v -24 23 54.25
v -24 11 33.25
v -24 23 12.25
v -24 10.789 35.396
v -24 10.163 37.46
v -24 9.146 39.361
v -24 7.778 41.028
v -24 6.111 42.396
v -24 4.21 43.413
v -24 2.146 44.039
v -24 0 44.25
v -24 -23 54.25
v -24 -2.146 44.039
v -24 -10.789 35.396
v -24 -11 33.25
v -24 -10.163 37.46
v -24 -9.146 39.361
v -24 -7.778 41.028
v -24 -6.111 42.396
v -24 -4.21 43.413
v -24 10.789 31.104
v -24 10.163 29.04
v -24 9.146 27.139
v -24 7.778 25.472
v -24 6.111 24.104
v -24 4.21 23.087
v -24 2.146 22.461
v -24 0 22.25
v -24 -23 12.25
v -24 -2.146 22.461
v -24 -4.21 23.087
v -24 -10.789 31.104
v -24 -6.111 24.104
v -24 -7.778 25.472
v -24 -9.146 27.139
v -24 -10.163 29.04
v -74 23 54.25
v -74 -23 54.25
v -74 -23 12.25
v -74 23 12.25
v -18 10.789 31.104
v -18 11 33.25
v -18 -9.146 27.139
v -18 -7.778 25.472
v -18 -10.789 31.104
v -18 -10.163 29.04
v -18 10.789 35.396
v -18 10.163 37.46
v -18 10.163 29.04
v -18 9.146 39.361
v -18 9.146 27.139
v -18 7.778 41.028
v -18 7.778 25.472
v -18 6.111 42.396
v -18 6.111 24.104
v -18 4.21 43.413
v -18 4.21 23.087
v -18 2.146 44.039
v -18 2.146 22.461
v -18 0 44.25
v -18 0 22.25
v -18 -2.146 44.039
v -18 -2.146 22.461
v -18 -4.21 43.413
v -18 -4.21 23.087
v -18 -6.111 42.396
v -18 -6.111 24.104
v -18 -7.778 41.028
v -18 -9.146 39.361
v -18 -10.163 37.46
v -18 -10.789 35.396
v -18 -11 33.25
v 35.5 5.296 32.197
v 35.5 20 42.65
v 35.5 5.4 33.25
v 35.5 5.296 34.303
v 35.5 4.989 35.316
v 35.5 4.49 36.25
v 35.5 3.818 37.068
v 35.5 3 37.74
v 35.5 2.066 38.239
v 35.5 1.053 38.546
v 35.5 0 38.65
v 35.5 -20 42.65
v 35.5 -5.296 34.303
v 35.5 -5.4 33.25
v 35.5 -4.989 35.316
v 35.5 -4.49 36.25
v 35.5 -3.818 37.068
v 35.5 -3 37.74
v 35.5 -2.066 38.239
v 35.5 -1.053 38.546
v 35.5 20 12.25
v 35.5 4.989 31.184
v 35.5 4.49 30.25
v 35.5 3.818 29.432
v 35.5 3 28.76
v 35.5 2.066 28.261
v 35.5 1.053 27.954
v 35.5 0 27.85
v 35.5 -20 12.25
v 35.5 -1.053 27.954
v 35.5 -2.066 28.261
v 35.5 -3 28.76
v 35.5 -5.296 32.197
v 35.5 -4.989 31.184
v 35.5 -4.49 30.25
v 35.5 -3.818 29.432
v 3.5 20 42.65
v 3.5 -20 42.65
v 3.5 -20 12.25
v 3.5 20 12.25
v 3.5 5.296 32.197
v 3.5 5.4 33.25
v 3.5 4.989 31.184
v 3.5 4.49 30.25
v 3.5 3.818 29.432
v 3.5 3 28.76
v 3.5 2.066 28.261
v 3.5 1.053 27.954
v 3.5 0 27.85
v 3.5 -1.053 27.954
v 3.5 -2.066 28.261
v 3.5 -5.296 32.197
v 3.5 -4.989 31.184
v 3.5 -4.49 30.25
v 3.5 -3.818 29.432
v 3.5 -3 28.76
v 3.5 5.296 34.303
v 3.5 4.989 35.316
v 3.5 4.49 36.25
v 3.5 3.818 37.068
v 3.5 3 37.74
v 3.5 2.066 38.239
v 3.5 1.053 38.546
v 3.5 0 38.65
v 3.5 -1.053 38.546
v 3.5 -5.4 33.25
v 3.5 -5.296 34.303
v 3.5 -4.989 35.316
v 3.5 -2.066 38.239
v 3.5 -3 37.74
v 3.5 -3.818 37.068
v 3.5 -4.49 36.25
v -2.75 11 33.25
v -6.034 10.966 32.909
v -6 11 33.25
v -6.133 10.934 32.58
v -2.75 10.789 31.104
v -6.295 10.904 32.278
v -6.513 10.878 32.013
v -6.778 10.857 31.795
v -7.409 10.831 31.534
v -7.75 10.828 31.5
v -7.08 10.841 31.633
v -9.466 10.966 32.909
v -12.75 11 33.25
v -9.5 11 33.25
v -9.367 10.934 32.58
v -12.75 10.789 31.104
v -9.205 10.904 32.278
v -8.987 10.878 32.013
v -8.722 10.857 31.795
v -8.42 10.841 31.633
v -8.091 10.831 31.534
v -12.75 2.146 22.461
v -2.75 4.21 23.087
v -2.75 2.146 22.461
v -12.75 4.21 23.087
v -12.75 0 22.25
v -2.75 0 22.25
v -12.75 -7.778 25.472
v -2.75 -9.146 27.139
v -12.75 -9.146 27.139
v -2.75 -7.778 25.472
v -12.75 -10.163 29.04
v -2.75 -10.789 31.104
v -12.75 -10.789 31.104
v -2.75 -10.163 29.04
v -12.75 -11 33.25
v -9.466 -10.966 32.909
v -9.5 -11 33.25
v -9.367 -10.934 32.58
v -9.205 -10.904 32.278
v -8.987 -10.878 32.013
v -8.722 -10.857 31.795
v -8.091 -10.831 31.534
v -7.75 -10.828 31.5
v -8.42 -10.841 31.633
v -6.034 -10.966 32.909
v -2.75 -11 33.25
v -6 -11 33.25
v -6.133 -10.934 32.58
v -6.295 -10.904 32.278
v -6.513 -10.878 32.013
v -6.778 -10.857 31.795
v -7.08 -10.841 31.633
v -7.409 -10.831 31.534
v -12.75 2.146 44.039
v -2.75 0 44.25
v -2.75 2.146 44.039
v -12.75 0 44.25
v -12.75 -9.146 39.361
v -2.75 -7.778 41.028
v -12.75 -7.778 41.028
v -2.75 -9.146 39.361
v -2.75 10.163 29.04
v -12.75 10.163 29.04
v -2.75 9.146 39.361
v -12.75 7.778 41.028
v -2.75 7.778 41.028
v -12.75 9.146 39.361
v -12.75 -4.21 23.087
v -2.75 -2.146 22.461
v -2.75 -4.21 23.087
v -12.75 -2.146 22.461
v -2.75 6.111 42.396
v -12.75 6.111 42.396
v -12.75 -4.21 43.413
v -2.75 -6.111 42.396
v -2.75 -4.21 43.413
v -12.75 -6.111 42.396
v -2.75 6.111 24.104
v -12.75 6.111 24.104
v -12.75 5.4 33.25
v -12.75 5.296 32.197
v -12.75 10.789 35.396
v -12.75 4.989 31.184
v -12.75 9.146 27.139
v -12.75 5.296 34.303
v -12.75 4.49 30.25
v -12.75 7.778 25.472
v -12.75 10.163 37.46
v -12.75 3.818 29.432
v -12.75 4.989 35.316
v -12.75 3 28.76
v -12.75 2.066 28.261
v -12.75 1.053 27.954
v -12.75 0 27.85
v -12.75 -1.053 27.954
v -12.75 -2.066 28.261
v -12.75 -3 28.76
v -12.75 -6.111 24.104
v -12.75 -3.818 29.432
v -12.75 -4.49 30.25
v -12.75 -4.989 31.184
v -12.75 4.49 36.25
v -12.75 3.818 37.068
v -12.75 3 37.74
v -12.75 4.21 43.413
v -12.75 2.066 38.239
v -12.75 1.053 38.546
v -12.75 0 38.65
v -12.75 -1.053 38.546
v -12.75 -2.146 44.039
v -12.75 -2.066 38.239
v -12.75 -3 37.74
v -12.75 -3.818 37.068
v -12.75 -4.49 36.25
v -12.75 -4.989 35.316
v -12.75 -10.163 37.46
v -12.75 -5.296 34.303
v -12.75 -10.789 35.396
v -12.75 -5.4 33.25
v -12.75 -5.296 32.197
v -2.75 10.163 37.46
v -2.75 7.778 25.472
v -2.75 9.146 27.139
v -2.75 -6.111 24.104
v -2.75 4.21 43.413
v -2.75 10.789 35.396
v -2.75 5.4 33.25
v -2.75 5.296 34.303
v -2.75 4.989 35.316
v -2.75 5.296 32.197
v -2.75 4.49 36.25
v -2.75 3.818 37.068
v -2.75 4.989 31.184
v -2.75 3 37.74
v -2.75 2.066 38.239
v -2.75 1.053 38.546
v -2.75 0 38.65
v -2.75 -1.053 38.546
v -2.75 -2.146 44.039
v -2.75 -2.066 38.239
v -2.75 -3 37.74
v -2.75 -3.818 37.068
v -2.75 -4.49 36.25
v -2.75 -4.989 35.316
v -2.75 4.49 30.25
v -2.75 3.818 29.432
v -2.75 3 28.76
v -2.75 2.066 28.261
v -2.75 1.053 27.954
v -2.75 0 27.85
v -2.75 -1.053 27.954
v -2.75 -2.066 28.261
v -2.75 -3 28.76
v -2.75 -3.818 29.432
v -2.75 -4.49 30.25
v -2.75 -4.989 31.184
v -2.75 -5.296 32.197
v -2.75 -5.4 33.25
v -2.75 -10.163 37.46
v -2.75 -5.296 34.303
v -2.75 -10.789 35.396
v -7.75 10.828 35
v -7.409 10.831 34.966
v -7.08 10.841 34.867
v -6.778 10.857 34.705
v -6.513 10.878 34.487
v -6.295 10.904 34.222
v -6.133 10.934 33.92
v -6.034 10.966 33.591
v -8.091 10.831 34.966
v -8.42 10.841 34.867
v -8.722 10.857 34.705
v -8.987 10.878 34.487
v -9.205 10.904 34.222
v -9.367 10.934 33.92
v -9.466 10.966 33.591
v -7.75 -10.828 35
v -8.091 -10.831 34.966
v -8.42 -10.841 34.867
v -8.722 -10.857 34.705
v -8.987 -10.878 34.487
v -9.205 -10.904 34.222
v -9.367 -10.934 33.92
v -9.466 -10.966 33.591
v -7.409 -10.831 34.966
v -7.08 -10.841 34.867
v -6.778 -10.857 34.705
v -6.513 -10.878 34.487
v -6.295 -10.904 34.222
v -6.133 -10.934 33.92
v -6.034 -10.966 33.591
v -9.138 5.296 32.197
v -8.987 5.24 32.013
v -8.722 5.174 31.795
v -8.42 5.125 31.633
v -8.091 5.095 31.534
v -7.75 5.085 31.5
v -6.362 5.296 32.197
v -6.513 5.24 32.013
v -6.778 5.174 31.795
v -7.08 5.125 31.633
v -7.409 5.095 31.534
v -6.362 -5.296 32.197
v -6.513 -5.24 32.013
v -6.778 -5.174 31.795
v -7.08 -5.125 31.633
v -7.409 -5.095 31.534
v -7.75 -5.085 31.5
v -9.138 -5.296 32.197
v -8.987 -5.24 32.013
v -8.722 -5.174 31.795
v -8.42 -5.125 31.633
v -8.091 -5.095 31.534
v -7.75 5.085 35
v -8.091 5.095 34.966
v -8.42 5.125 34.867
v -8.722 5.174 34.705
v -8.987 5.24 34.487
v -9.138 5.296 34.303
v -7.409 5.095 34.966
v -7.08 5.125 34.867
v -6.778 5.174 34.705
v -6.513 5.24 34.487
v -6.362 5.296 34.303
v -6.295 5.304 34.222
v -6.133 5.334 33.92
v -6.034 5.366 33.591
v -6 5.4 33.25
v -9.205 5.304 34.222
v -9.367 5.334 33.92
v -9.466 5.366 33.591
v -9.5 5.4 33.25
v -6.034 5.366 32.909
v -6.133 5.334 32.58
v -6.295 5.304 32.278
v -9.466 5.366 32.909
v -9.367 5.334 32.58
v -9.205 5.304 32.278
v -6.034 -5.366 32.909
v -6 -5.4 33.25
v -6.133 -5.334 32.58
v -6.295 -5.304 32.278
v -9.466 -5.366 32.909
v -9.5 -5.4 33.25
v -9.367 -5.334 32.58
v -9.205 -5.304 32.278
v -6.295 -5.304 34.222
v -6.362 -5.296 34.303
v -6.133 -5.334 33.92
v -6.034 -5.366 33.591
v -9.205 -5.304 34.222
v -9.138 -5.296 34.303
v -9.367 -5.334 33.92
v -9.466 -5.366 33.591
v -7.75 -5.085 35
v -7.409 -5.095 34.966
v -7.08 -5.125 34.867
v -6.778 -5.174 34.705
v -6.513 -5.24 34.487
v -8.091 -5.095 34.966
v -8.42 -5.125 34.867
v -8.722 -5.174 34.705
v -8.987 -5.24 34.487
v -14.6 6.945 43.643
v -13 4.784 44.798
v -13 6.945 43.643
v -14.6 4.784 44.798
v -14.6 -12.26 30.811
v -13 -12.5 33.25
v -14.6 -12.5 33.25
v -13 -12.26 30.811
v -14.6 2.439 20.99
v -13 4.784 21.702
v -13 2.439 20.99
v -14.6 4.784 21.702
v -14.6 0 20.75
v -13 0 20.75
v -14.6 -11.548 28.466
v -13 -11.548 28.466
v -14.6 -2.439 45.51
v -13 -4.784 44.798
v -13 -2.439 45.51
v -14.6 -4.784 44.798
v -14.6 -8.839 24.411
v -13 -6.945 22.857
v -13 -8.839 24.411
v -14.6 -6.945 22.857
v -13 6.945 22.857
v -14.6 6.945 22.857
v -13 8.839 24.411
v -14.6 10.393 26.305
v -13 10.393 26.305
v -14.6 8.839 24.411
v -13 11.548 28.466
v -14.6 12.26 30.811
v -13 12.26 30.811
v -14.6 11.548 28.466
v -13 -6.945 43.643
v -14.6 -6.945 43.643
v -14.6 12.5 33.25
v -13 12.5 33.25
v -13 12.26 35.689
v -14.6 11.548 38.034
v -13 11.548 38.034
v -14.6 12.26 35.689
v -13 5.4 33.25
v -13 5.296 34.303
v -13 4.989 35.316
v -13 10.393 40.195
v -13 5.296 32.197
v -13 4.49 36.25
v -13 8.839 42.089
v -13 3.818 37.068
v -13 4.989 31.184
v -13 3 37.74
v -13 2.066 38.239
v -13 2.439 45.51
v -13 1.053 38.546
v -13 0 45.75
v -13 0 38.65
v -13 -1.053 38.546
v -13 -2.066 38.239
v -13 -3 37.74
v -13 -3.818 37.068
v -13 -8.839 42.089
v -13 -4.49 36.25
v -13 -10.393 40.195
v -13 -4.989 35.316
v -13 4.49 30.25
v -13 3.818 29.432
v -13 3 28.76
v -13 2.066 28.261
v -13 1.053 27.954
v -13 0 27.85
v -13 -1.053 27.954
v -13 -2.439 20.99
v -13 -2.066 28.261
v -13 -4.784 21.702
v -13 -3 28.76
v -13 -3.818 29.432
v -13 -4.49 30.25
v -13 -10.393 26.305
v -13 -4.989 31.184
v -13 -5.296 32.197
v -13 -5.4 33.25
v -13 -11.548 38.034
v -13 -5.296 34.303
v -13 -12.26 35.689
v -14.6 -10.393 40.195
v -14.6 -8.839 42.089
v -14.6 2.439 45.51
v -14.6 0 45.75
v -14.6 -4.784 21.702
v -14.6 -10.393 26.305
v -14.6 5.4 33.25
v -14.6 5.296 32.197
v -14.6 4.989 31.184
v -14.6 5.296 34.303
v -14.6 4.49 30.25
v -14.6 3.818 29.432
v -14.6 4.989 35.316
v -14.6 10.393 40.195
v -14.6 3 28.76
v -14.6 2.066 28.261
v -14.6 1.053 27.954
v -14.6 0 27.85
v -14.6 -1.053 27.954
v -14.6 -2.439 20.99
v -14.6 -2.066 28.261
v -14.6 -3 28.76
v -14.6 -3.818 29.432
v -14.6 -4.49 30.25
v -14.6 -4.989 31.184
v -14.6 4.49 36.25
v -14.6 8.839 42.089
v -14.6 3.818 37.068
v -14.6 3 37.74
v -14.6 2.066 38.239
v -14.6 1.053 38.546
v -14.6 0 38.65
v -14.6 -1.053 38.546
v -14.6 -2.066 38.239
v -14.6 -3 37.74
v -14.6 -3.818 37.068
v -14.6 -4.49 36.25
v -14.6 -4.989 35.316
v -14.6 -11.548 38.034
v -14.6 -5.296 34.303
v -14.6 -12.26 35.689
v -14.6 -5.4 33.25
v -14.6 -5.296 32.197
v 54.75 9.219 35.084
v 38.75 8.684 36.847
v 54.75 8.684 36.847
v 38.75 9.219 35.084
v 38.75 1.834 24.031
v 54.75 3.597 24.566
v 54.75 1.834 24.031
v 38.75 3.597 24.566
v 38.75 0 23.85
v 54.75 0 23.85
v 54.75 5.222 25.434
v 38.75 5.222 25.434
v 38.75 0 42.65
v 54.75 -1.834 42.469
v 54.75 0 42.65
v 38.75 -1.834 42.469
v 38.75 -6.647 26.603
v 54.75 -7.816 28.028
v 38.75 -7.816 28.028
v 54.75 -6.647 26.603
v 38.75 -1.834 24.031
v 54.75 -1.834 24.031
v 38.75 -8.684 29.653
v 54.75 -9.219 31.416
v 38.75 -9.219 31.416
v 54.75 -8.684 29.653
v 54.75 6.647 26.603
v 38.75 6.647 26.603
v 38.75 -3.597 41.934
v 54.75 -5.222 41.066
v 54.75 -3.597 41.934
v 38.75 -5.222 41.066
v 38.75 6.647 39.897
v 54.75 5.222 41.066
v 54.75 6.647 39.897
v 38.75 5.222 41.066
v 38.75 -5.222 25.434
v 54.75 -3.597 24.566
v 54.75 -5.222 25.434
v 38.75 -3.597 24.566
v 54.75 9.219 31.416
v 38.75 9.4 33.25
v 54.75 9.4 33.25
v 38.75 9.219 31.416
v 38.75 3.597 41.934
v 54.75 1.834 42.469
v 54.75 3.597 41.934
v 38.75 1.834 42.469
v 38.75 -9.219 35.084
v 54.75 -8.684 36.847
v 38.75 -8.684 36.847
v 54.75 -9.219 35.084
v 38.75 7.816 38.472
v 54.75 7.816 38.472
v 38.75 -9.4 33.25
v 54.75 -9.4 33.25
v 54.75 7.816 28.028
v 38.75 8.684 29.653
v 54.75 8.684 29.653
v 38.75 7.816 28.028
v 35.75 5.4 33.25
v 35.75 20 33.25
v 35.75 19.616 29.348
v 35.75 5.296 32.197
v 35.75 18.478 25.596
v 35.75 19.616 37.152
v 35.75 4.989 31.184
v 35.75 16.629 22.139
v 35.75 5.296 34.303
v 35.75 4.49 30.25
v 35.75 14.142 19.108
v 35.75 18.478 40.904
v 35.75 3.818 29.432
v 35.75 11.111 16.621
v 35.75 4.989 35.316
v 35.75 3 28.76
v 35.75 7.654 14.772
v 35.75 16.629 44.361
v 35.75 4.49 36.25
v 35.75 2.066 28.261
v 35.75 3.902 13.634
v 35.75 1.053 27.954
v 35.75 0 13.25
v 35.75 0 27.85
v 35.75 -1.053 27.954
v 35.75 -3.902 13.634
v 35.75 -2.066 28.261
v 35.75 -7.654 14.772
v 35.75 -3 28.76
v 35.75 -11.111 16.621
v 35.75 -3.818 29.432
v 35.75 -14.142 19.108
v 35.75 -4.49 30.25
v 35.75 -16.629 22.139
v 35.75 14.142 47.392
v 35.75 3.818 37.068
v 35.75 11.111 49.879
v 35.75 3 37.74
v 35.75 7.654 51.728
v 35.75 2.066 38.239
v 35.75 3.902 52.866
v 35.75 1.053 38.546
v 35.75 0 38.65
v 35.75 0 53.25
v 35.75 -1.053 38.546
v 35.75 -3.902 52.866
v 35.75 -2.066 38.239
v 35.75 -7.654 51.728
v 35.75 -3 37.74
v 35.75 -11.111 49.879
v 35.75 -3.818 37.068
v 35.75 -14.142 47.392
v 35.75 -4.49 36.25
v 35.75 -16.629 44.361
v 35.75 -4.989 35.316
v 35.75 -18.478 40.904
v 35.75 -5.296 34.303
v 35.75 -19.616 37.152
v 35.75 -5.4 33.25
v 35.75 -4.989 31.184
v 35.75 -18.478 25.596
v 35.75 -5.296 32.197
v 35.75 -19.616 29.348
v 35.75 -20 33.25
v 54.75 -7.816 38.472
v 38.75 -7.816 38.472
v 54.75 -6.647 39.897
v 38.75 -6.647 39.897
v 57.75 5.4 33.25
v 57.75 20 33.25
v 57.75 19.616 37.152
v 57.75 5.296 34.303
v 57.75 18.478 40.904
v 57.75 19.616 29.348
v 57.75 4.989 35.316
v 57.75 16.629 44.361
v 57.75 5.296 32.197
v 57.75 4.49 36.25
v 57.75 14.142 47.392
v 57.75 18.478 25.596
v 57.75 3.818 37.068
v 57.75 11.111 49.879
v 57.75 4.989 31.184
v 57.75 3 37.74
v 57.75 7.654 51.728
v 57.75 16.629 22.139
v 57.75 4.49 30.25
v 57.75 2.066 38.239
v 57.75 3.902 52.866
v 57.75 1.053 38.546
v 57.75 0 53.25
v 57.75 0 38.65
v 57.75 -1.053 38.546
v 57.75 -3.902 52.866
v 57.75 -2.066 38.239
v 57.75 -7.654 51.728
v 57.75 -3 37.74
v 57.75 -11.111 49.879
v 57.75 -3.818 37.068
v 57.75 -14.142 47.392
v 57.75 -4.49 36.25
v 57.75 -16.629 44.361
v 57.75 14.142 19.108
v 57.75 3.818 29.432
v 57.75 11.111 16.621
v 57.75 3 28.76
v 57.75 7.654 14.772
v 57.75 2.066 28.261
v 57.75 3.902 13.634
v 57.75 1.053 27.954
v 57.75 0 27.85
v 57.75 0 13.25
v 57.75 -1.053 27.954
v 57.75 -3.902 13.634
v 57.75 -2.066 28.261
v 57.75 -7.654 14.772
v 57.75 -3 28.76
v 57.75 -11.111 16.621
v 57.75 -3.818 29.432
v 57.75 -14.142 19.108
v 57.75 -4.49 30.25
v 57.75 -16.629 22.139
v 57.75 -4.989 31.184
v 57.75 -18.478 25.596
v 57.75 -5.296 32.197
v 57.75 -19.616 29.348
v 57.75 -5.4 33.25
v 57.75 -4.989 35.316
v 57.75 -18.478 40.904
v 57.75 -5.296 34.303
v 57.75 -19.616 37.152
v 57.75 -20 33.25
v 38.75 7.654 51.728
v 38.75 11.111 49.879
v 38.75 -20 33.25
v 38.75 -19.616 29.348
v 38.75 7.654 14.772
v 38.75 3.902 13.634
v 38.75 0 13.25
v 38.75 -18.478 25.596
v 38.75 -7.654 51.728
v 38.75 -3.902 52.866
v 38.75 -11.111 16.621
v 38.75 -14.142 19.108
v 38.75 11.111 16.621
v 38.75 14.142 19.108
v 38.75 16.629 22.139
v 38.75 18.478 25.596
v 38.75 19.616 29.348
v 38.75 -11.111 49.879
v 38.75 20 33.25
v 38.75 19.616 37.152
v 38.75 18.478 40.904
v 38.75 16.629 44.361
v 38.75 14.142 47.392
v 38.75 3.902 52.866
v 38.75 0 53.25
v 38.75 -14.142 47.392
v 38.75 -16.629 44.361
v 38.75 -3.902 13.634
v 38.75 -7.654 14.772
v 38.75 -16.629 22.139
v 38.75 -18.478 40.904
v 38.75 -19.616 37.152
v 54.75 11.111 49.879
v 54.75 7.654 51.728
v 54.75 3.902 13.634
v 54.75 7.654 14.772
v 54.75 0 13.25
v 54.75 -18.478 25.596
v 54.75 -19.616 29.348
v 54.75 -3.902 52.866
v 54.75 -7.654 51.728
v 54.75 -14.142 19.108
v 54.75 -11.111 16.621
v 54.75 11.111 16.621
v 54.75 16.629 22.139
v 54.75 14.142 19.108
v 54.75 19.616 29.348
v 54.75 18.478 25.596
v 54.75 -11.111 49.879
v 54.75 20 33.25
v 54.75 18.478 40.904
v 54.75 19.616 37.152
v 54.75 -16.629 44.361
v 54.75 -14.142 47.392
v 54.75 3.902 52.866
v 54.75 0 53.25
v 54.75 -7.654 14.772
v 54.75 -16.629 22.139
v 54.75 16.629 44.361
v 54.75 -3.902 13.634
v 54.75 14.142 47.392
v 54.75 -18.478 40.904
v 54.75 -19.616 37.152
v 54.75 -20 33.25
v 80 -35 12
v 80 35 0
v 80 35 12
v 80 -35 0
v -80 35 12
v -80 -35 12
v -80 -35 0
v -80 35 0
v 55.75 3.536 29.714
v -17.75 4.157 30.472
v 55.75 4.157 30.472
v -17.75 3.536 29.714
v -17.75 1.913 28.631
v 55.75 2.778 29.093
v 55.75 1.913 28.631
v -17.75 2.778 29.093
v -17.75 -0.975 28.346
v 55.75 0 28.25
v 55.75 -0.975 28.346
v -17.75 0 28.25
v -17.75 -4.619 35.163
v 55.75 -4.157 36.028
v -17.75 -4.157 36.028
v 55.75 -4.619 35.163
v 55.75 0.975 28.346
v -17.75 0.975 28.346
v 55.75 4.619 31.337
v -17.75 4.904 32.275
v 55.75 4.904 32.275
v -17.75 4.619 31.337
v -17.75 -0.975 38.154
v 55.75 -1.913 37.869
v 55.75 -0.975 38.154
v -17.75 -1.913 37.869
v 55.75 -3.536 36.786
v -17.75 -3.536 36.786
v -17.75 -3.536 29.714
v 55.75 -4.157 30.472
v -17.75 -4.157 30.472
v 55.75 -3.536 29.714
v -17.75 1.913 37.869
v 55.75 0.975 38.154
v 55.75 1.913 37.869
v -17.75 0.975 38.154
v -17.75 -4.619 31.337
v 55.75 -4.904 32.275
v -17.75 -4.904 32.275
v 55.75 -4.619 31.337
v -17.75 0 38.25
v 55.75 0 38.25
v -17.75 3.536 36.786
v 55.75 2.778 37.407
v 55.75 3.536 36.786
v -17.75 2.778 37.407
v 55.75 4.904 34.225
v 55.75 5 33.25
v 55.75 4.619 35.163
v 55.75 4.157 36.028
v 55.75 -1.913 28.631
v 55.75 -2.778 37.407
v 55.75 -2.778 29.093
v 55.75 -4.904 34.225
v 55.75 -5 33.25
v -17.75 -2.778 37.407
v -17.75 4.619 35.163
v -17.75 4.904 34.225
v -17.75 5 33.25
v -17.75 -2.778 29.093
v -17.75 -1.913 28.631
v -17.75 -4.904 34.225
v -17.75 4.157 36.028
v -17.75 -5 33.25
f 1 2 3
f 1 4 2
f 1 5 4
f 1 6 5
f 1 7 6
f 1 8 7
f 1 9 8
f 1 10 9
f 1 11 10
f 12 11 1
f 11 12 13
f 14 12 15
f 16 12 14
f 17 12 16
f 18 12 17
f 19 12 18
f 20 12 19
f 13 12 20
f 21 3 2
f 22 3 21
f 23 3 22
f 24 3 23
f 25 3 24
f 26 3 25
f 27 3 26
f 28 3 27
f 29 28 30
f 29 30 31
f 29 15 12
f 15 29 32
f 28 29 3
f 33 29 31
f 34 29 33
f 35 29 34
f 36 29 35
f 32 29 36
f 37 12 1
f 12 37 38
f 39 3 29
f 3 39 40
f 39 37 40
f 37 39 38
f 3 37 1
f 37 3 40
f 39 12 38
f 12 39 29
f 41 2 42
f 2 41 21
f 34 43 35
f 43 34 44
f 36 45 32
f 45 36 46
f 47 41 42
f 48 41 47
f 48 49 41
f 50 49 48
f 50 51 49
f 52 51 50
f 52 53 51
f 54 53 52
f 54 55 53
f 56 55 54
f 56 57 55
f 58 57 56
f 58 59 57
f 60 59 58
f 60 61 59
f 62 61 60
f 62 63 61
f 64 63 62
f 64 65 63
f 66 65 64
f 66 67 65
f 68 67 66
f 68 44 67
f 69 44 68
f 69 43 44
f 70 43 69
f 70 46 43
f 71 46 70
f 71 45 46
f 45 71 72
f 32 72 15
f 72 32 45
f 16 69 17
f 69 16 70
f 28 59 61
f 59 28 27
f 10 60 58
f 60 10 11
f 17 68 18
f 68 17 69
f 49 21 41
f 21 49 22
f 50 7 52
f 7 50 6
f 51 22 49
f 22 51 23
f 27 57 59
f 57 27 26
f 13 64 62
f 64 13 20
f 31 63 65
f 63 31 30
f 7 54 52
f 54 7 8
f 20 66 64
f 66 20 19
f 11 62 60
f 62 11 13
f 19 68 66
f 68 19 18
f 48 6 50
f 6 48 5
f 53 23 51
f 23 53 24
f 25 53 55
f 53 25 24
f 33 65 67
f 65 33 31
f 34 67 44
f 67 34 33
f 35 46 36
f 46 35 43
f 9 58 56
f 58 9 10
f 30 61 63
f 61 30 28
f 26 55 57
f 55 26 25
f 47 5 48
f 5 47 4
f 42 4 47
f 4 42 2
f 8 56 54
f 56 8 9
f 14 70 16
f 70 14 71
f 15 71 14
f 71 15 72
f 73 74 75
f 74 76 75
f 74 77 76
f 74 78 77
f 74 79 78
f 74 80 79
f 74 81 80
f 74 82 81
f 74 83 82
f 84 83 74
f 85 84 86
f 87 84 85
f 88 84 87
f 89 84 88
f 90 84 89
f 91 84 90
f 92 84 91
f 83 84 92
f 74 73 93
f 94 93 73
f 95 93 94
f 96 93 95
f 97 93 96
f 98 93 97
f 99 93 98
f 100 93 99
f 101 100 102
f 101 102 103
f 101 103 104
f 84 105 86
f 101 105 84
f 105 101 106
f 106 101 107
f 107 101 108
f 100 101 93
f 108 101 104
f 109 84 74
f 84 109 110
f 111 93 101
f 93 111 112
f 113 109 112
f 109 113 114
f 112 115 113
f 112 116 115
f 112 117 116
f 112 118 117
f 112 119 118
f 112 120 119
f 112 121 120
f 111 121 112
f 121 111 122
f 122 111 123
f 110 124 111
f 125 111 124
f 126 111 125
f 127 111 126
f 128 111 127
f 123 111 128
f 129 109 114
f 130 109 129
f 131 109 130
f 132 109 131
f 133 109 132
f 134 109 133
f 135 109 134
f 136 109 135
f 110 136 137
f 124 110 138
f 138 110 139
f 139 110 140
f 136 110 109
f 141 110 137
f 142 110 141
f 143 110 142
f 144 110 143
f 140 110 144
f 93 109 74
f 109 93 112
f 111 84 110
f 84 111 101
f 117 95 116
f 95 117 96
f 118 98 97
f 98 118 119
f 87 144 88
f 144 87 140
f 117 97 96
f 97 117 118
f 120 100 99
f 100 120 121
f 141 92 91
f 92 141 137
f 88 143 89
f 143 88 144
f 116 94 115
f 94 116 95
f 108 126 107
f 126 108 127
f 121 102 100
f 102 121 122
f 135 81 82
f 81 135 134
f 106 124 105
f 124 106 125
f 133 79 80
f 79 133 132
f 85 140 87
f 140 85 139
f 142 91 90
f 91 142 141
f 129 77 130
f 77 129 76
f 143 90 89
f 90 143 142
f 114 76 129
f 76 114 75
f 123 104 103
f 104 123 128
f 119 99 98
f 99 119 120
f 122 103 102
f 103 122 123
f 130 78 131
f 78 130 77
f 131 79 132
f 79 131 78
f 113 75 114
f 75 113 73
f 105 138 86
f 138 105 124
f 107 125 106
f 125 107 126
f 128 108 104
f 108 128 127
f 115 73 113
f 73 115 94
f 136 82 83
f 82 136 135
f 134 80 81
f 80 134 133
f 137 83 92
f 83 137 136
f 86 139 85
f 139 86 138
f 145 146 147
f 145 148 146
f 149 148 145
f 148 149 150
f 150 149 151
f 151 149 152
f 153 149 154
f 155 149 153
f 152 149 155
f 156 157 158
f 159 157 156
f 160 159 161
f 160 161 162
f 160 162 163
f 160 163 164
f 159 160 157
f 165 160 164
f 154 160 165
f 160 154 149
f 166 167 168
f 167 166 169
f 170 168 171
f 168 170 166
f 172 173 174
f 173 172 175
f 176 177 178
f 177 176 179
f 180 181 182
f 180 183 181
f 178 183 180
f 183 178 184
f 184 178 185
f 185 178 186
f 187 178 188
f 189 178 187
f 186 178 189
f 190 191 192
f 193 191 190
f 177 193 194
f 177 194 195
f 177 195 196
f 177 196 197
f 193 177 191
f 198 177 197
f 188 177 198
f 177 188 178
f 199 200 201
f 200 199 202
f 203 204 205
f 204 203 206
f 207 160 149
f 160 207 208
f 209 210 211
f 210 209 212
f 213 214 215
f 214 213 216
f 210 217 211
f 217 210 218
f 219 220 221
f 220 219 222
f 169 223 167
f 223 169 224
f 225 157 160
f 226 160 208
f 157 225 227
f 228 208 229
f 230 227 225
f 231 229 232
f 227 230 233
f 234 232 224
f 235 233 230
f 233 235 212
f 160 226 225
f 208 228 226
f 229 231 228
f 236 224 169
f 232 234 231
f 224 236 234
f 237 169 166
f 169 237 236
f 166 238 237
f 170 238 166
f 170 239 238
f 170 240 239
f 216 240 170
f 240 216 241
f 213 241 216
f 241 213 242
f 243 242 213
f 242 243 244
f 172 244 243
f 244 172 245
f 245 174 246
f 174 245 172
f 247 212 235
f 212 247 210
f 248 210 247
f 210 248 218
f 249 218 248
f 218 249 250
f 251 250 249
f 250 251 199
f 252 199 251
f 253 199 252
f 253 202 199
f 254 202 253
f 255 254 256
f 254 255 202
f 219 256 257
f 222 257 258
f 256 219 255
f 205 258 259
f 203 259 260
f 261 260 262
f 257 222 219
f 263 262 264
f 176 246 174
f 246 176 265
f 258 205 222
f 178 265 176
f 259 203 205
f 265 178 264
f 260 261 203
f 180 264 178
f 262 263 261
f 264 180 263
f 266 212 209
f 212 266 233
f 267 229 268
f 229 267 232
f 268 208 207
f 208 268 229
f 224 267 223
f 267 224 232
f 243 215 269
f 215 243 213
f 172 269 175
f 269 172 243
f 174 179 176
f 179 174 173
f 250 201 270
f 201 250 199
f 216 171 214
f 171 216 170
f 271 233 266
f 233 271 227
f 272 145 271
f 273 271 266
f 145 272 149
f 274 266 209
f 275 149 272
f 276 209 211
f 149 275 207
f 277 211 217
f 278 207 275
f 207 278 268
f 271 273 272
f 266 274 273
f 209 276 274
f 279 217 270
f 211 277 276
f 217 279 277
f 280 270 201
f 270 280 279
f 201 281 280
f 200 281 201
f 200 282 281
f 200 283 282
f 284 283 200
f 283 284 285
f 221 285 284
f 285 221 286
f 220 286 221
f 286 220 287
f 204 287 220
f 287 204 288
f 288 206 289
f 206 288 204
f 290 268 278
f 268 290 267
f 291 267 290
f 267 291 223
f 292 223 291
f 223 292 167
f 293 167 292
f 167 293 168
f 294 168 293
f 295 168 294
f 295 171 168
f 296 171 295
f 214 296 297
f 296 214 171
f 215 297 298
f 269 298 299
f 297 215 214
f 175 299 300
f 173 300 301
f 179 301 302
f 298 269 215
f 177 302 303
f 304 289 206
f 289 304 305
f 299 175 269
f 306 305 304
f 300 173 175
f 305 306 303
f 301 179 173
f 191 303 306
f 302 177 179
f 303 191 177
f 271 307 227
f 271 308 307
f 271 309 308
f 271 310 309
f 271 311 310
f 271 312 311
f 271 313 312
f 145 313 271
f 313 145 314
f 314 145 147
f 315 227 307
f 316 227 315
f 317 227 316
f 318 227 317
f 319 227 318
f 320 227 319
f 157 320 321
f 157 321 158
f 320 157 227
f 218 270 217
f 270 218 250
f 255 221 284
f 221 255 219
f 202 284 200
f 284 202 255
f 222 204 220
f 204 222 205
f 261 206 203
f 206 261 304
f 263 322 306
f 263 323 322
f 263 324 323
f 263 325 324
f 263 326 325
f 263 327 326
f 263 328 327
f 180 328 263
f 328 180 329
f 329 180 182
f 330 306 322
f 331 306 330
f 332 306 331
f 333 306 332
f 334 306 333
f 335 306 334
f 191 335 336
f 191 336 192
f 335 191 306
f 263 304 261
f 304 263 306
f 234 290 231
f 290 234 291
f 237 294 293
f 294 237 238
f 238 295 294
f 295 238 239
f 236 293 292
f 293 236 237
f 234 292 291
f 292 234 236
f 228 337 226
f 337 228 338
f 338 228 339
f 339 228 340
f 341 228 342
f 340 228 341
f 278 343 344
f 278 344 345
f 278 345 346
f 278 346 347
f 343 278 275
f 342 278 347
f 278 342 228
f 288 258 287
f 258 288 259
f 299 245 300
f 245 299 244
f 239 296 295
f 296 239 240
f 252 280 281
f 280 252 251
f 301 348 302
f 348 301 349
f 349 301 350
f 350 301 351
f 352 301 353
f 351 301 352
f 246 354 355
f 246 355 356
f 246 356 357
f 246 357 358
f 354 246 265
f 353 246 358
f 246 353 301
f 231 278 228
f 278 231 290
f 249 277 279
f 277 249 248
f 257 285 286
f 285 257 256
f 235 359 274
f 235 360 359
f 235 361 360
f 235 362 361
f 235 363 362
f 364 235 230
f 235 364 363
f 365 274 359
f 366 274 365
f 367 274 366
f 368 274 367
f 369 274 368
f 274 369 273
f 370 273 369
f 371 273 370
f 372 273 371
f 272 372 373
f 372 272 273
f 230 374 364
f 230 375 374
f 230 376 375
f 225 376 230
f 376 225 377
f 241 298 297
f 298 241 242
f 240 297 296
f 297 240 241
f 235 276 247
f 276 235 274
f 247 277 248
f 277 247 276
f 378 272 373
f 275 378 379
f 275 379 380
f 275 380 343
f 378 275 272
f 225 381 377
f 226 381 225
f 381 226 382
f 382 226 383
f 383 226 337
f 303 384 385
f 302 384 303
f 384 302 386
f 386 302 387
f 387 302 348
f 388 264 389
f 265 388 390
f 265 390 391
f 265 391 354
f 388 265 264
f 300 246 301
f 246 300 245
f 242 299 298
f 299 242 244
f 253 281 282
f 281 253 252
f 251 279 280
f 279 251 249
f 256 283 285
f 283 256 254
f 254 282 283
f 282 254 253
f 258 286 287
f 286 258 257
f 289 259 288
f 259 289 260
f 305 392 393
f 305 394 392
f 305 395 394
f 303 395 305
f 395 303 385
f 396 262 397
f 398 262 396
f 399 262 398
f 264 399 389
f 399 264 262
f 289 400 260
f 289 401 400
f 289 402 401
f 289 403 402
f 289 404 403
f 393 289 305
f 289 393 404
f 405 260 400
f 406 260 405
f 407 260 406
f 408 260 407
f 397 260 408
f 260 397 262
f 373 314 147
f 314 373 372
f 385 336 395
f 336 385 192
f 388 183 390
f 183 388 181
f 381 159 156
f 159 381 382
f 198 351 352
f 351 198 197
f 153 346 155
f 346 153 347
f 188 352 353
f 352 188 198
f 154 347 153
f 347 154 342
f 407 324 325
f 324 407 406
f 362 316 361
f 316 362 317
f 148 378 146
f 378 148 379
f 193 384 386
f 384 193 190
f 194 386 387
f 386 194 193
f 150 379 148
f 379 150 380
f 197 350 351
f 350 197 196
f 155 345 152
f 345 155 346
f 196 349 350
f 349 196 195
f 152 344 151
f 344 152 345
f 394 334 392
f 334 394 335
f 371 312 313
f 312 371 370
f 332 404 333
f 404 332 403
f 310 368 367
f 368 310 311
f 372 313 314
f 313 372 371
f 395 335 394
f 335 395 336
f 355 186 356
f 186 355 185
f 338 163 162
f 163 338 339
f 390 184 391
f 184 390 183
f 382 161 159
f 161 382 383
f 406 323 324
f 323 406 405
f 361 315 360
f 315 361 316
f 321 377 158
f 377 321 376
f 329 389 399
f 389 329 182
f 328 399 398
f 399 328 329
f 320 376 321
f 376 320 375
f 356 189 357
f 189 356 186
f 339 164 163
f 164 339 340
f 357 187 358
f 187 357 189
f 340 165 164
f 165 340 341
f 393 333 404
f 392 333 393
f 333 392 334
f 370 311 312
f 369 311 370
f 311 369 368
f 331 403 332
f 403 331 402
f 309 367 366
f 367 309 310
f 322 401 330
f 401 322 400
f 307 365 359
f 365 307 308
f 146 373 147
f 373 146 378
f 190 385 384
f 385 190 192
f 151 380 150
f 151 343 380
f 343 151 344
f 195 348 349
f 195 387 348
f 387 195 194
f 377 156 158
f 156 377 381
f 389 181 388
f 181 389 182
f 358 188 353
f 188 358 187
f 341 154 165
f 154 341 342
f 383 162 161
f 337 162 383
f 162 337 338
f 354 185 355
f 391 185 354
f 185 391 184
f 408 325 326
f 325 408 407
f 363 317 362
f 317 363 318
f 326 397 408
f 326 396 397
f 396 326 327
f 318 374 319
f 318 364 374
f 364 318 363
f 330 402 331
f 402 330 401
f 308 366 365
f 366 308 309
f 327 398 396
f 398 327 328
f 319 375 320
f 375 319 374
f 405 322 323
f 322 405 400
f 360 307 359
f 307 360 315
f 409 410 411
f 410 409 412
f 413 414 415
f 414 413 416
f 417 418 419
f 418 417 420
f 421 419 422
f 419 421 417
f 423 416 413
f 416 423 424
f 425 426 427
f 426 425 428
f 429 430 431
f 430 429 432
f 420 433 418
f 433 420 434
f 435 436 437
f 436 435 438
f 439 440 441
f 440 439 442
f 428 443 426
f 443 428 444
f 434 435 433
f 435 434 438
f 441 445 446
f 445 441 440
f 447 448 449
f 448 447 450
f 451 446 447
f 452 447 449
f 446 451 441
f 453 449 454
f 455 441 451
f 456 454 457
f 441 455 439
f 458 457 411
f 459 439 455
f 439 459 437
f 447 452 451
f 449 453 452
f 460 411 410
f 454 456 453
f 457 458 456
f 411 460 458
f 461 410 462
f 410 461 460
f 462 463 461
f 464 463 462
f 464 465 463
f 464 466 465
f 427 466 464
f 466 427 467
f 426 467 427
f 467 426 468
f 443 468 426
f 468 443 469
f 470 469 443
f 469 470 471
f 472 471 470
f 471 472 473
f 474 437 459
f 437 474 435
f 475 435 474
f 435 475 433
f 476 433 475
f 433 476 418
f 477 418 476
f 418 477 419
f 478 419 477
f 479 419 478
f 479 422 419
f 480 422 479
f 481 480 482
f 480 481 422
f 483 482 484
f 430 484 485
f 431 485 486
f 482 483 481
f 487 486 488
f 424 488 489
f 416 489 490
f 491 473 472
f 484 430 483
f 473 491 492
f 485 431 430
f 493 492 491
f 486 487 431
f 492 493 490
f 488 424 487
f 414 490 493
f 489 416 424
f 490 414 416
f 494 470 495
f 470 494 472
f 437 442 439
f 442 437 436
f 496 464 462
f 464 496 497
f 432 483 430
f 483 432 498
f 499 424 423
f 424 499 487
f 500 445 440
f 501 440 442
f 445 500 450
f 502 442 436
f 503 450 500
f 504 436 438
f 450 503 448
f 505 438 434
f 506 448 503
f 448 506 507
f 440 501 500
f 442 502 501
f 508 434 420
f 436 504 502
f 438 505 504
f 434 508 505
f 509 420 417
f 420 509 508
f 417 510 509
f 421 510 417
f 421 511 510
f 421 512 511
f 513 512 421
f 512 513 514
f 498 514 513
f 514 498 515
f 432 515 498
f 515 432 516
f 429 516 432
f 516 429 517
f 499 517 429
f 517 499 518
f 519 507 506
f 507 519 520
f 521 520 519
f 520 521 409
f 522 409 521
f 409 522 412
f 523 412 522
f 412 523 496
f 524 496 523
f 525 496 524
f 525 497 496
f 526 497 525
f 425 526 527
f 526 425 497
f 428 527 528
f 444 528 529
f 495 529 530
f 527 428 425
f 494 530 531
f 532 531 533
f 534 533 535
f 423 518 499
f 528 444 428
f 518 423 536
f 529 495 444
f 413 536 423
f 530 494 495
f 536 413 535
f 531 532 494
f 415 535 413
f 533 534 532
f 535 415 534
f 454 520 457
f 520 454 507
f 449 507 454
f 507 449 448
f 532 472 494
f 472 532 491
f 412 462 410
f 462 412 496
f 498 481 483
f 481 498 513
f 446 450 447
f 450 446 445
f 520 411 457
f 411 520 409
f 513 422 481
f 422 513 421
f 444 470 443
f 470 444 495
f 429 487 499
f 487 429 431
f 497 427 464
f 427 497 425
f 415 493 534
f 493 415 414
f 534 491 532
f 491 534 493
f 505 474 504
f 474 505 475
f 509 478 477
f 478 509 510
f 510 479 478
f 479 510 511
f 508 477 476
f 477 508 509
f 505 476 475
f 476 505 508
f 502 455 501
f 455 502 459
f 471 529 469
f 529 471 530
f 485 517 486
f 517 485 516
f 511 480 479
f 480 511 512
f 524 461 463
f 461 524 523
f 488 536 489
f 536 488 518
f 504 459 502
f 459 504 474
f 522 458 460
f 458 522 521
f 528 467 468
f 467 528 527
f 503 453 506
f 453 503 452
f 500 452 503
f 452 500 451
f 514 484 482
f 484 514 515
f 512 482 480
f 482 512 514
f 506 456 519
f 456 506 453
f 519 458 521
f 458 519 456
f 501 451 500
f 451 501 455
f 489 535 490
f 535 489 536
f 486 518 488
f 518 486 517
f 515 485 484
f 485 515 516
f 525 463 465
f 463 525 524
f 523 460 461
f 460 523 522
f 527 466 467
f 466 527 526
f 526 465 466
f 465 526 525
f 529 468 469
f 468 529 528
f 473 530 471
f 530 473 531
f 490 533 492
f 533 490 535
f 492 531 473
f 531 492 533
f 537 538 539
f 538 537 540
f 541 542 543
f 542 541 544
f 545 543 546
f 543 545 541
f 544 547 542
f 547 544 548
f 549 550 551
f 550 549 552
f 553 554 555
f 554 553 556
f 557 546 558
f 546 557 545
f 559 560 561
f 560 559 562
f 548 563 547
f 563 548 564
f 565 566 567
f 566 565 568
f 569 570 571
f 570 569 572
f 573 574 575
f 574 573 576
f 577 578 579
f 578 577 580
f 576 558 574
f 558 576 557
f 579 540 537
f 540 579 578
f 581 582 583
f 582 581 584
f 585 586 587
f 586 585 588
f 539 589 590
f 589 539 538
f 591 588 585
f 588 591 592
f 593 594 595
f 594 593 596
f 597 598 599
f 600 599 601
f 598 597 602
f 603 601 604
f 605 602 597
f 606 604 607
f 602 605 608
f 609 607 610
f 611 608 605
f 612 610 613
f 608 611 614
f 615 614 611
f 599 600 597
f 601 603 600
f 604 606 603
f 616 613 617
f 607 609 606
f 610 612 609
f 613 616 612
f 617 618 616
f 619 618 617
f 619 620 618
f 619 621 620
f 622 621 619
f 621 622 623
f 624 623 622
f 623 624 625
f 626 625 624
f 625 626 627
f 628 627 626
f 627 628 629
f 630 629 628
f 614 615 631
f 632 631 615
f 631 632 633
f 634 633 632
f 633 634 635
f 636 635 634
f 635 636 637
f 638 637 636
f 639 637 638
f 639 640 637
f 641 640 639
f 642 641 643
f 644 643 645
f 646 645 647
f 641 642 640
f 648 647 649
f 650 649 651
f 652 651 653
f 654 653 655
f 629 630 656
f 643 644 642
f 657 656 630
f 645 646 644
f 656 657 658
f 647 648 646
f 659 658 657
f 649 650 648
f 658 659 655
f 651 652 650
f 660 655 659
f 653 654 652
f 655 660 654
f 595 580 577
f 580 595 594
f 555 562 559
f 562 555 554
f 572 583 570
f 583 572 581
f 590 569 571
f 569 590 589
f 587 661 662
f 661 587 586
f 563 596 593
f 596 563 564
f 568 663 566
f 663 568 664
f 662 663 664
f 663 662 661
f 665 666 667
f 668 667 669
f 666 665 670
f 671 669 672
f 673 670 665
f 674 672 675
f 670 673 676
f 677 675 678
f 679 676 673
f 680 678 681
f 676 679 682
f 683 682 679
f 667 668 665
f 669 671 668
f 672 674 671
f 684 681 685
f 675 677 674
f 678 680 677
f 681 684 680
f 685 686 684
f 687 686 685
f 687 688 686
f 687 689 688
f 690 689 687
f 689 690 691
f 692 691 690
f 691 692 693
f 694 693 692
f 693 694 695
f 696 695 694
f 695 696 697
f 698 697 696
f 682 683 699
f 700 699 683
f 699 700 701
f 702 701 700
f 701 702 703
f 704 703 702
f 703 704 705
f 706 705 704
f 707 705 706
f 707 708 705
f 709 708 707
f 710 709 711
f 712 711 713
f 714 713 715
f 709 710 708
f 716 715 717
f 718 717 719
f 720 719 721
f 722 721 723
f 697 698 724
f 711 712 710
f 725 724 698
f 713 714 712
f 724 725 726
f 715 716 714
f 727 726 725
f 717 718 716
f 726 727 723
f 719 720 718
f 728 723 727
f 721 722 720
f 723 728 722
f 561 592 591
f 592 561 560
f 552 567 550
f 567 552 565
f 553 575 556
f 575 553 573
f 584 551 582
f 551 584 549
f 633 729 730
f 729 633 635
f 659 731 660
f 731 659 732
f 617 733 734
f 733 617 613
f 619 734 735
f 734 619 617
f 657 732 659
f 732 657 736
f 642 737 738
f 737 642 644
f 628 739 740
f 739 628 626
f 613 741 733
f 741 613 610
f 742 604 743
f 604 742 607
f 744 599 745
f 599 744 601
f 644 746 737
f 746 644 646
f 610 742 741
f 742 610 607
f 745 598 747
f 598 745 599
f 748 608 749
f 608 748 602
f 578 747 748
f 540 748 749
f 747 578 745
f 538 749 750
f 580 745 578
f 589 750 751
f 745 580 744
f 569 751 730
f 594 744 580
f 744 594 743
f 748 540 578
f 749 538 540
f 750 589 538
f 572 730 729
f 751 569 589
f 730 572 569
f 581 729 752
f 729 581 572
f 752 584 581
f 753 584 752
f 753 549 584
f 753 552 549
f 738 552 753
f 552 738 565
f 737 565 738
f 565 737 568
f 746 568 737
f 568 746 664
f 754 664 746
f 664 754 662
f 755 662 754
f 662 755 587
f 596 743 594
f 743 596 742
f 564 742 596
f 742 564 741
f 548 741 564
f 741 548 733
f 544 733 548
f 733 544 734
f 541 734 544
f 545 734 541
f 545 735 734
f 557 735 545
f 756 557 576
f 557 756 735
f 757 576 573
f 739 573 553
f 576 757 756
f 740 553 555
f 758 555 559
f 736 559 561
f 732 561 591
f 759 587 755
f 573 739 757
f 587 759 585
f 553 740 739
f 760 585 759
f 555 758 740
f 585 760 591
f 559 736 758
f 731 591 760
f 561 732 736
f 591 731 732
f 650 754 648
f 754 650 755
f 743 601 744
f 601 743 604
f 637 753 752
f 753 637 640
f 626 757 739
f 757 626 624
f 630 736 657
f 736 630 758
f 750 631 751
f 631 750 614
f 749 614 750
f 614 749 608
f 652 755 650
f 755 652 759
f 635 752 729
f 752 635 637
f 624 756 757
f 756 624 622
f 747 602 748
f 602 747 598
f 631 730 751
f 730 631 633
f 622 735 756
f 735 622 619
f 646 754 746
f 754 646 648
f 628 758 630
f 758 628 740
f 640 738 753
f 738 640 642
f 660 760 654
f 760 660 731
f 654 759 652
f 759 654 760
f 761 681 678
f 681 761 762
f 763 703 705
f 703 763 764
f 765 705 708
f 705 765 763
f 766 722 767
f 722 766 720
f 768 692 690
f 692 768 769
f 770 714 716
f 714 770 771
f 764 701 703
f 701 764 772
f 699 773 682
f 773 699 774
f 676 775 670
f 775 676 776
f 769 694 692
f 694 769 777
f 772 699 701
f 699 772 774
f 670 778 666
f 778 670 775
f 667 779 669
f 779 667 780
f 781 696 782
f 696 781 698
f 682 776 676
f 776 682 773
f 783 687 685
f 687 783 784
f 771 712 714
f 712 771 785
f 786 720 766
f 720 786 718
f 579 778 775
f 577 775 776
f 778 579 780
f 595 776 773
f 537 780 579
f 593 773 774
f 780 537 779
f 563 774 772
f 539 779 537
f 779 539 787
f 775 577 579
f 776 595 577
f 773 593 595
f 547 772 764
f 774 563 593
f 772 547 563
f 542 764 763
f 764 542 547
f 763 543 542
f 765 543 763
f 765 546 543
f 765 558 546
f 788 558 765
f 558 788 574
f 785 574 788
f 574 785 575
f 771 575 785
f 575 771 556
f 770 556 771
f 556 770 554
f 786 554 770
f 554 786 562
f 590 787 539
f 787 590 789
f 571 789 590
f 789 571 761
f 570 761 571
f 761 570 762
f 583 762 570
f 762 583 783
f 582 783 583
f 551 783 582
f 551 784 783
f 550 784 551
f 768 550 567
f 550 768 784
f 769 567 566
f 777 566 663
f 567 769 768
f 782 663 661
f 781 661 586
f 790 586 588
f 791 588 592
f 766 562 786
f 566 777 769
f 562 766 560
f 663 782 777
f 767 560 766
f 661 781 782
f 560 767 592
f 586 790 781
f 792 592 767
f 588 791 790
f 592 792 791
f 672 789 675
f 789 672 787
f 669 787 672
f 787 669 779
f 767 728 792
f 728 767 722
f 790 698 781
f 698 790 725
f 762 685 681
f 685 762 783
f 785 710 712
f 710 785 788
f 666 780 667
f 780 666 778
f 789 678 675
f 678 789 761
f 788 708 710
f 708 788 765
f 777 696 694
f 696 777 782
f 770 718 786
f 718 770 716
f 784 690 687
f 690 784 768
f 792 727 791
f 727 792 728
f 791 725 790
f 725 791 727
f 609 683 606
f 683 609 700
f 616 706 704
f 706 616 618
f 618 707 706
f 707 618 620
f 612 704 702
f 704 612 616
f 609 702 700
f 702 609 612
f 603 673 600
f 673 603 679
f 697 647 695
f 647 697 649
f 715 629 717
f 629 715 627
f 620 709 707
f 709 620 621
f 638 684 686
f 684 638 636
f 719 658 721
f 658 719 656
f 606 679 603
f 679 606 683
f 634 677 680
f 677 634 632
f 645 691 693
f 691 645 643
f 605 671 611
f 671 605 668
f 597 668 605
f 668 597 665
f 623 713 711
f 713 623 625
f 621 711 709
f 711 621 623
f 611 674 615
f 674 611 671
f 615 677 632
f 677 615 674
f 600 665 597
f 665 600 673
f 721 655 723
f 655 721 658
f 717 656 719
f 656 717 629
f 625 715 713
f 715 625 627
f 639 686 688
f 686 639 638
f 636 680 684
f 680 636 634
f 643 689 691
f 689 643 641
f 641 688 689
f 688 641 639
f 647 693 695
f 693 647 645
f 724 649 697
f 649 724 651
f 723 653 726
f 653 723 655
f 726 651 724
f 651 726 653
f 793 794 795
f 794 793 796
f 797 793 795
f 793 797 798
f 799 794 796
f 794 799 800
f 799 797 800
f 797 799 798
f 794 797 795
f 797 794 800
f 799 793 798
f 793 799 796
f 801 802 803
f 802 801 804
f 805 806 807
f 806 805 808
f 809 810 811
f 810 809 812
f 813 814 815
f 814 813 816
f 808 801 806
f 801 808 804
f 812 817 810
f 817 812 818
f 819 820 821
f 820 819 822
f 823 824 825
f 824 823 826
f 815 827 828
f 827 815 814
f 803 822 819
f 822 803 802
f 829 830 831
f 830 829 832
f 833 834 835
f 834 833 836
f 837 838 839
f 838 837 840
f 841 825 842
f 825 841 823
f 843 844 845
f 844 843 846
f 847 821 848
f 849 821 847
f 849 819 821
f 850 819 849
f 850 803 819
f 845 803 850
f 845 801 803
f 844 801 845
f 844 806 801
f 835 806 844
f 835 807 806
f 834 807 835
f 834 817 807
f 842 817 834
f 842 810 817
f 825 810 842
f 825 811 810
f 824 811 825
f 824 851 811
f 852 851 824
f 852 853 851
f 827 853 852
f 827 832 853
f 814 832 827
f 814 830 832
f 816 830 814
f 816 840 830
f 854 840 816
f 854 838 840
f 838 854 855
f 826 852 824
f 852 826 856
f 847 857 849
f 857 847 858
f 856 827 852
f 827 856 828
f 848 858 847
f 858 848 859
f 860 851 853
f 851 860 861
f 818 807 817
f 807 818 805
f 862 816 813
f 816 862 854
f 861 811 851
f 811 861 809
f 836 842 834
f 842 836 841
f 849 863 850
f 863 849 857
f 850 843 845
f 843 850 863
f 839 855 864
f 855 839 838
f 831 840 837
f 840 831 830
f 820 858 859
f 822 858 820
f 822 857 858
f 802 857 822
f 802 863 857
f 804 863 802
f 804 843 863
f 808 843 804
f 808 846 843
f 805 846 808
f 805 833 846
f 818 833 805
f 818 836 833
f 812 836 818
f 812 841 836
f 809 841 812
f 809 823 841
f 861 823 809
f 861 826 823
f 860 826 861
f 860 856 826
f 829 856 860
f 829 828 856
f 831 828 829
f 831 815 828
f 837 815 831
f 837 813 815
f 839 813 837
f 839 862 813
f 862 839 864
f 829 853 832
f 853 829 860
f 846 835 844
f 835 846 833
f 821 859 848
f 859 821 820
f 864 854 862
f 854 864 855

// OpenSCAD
$fn = 32;

// ------------------------------------------------------------------------
// Motor drive station: motor 50 x 42 mm, shaft d10, pulley d40
// Every part is its own module, assembly() places every instance.
// ------------------------------------------------------------------------

// --- part 1 ---
module station_bed() {
  difference() {
    translate([-80, -35, 0]) cube([160, 70, 12]);
  }
}

// --- part 2 ---
module drive_motor() {
  union() {
    translate([-25, -23, 0]) cube([50, 46, 42]);
    translate([28, 0, 21]) rotate([0, 90, 0]) cylinder(h = 6, d = 22, center = true);
  }
}

// --- part 3 ---
module pillow_block() {
  difference() {
    translate([-16, -20, 0]) cube([32, 40, 30.4]);
    translate([0, 0, 21]) rotate([0, 90, 0]) cylinder(h = 34, d = 10.8, center = true);
  }
}

// --- part 4 ---
module drive_shaft() {
  translate([0, 0, -36.75]) cylinder(h = 73.5, d = 10);
}

// --- part 5 ---
module shaft_collar() {
  difference() {
    cylinder(h = 10, d = 22);
    translate([0, 0, -1]) cylinder(h = 12, d = 10.8);
    translate([0, 0, 5]) rotate([90, 0, 0]) cylinder(h = 24, d = 3.5, center = true);
  }
}

// --- part 6 ---
module collar_washer() {
  difference() {
      translate([0, 0, 0]) cylinder(h = 1.6, d = 25);
      translate([0, 0, -1]) cylinder(h = 3.6, d = 10.8);
    }
}

// --- part 7 ---
module drive_pulley() {
  difference() {
    union() {
      cylinder(h = 22, d = 18.8);
      cylinder(h = 3, d = 40);
      translate([0, 0, 19]) cylinder(h = 3, d = 40);
    }
    translate([0, 0, -1]) cylinder(h = 24, d = 10.8);
  }
}

// --- assembly ---
module assembly() {
  color([0.80, 0.24, 0.20]) translate([0, 0, 0]) rotate([0, 0, 0]) station_bed();
  color([0.20, 0.45, 0.75]) translate([-49, 0, 12.25]) rotate([0, 0, 0]) drive_motor();
  color([0.25, 0.62, 0.32]) translate([19.5, 0, 12.25]) rotate([0, 0, 0]) pillow_block();
  color([0.92, 0.70, 0.18]) translate([19, 0, 33.25]) rotate([0, 90, 0]) drive_shaft();
  color([0.58, 0.35, 0.70]) translate([-12.75, 0, 33.25]) rotate([0, 90, 0]) shaft_collar();
  color([0.16, 0.66, 0.66]) translate([-14.6, 0, 33.25]) rotate([0, 90, 0]) collar_washer();
  color([0.85, 0.48, 0.18]) translate([35.75, 0, 33.25]) rotate([0, 90, 0]) drive_pulley();
}

assembly();
